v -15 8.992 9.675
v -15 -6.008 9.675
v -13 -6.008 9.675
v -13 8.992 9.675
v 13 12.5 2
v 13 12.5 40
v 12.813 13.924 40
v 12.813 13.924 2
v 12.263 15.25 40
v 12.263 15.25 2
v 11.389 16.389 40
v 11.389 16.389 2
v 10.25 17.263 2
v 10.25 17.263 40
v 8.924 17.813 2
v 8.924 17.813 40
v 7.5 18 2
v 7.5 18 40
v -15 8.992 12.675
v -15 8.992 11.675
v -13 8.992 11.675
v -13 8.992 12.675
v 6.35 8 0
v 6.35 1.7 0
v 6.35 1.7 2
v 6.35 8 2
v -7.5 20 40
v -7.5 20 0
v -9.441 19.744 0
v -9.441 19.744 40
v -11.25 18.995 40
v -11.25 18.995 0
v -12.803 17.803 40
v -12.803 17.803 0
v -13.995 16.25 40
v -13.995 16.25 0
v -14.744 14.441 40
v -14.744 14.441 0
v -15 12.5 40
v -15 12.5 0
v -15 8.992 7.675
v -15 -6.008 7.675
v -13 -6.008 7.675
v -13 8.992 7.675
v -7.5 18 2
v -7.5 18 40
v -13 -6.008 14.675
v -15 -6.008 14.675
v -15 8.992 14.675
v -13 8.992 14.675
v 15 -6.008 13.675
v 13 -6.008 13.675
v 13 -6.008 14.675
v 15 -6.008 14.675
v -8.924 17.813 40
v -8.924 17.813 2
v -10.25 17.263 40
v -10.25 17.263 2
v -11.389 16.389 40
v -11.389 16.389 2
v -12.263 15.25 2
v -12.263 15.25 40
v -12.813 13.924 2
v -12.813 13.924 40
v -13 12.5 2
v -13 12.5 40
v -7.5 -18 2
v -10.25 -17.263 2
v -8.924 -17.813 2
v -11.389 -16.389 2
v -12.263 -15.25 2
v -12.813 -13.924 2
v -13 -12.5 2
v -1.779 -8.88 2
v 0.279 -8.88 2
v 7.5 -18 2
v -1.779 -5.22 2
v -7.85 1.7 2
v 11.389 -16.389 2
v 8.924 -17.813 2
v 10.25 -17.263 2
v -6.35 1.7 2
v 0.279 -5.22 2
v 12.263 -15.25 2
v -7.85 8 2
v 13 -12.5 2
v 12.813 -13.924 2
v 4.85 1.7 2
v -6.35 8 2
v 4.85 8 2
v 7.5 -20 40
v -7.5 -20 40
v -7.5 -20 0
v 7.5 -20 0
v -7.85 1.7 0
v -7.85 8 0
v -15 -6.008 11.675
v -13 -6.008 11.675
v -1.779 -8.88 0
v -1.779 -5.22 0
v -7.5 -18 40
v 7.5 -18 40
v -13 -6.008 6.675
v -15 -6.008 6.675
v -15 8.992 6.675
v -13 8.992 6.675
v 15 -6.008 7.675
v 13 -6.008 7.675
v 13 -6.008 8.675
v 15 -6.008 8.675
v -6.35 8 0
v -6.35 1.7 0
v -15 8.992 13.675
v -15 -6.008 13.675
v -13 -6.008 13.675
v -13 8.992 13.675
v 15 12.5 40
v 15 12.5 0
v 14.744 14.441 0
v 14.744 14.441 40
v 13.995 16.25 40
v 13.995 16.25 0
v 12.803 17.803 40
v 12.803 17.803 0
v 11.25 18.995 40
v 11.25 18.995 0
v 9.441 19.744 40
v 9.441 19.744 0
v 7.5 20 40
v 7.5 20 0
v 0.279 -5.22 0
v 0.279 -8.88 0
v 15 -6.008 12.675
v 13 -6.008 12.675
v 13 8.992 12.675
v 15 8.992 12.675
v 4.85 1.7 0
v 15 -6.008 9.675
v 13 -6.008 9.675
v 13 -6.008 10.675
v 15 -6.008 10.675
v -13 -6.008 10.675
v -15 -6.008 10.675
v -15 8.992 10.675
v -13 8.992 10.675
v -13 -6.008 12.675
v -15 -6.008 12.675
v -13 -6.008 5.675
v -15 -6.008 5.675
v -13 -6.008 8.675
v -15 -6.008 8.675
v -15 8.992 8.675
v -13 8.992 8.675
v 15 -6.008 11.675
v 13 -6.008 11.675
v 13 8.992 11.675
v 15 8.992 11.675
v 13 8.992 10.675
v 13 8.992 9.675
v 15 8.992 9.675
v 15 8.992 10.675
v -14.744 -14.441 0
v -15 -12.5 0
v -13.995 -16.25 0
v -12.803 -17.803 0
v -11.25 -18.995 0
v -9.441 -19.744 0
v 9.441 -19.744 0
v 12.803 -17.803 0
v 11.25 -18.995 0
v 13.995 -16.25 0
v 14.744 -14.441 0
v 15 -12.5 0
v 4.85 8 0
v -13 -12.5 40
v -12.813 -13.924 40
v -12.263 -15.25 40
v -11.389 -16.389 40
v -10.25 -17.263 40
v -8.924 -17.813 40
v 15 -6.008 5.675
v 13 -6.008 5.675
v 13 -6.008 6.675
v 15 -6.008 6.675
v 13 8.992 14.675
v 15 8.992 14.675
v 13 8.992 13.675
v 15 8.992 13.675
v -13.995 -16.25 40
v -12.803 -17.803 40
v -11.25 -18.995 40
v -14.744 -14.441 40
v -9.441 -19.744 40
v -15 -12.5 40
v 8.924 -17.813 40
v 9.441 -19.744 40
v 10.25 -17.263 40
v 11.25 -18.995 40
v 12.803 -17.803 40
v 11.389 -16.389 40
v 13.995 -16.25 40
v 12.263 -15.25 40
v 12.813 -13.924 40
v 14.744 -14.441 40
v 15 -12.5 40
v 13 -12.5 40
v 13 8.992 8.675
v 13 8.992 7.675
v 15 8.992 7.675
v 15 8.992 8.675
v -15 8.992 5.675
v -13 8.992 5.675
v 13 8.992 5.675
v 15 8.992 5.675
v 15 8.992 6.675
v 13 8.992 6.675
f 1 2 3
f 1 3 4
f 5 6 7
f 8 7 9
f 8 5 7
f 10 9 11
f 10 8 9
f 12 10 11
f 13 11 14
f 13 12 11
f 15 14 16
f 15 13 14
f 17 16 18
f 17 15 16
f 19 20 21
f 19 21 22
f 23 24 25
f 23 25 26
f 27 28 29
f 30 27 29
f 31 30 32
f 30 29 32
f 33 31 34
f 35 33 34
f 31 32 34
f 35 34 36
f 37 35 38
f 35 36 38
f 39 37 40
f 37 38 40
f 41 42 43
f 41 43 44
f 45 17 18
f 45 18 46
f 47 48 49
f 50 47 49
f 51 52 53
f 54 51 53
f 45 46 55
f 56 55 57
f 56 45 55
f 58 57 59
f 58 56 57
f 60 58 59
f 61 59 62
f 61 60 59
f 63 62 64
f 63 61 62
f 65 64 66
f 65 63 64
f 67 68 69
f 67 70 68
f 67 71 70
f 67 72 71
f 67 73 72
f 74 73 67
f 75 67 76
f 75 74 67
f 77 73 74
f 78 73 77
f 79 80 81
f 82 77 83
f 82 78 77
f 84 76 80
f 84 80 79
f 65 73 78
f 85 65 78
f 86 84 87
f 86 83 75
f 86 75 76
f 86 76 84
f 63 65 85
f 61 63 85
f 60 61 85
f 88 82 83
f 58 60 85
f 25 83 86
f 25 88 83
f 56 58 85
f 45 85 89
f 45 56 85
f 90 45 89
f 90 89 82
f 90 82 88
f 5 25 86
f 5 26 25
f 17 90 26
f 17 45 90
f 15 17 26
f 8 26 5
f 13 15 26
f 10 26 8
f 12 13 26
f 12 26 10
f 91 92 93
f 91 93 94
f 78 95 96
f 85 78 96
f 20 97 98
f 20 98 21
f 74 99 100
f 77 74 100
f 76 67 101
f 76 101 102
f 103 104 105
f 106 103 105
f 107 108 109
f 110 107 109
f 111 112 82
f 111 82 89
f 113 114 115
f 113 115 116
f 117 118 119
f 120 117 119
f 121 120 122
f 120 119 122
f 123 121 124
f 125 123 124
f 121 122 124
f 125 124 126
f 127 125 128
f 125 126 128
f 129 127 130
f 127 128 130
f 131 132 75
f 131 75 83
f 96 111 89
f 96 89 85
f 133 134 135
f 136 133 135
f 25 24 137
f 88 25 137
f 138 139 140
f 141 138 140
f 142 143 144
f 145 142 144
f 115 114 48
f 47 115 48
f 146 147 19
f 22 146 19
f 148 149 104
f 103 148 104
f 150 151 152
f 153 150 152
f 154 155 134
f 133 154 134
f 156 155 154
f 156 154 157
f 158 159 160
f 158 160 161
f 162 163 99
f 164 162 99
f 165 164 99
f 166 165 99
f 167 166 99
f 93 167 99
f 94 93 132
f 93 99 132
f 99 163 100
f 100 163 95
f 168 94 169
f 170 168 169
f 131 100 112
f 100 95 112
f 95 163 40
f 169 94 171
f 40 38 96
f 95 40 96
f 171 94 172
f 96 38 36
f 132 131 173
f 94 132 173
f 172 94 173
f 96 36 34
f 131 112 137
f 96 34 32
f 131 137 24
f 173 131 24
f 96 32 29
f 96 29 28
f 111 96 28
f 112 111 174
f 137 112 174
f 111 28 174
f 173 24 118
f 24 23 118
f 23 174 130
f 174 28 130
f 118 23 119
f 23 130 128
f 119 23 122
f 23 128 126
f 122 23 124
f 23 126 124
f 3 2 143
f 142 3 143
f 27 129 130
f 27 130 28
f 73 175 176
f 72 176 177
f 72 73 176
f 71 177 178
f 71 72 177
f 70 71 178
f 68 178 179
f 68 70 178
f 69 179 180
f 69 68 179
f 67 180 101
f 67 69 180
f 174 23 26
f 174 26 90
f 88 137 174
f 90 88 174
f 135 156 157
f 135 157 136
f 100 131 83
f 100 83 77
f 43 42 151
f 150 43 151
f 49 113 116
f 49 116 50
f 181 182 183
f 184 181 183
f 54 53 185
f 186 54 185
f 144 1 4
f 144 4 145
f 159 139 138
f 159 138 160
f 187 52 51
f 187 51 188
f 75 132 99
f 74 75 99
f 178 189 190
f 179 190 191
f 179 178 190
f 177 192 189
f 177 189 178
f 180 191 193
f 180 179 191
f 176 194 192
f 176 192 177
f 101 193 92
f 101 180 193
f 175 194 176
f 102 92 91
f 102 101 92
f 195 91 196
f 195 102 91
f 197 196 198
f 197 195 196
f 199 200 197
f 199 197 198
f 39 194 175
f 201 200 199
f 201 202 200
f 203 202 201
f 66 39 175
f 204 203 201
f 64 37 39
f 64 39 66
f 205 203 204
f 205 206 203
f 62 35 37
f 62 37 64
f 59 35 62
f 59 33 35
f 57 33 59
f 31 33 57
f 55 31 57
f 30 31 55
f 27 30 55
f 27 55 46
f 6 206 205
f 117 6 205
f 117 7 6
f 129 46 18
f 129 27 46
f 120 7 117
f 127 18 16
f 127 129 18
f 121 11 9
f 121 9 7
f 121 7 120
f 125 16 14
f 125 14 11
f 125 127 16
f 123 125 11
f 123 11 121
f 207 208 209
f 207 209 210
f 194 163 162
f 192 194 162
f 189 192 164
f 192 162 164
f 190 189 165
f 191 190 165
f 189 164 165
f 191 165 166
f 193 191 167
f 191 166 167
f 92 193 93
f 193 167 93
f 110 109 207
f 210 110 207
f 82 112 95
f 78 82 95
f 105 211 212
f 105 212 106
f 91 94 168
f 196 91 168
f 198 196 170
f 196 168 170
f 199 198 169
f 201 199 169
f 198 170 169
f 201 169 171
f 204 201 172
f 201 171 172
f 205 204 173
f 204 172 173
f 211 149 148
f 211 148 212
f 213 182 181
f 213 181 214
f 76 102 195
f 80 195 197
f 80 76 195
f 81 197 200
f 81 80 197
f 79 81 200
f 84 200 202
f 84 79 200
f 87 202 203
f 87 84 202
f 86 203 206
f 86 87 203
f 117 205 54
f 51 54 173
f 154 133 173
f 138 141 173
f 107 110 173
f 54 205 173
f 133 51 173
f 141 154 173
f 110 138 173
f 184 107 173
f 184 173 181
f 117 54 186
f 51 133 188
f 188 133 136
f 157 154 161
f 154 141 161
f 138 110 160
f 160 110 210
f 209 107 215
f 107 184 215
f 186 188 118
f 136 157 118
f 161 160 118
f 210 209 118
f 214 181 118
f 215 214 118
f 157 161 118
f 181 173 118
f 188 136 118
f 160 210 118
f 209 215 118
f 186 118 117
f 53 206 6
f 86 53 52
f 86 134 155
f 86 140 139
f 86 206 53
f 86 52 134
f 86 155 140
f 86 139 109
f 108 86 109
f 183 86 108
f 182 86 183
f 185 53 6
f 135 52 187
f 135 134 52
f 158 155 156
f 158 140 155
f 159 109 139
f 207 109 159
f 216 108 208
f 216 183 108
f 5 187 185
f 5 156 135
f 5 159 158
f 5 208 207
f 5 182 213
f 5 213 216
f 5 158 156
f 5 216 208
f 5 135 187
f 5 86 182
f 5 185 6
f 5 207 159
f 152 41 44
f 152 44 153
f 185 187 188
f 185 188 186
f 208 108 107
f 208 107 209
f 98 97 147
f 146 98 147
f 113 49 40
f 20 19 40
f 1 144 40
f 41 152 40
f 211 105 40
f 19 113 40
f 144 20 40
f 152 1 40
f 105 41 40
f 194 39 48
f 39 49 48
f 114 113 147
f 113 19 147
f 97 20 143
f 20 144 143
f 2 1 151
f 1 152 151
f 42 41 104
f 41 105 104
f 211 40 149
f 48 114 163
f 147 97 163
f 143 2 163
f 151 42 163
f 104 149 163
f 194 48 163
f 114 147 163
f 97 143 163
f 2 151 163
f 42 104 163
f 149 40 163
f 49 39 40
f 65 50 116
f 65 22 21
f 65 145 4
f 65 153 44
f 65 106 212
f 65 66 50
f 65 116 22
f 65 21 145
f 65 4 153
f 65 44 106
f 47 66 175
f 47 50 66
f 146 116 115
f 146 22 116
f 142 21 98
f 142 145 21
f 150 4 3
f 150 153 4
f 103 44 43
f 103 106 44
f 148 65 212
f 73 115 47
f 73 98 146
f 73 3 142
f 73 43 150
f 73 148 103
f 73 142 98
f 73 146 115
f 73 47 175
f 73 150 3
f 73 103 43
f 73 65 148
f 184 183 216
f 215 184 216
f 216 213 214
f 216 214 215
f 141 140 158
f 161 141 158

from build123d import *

# Parameters (mm, degrees)
BOSS_EXTRUDE1_DEPTH     = 40
SHELL1_T                = -2
SKETCH2_W               = 1.5
SKETCH2_H               = 6.3
SKETCH2_W_2             = 2.058506146
SKETCH2_H_2             = 3.660298136
CUT_EXTRUDE1_DEPTH      = 25
SKETCH3_W               = 1
SKETCH3_H               = 15
CUT_EXTRUDE2_DEPTH      = 1
CUT_EXTRUDE2_DEPTH_BACK = 31


with BuildPart() as part:
    # Sketch1 → Boss-Extrude1 (new body)
    with BuildSketch(Plane.XY):
        with BuildLine():
            Line((-7.5, -20), (7.5, -20))
            ThreePointArc((7.5, -20), (12.803300859, -17.803300859), (15, -12.5))
            Line((15, -12.5), (15, 12.5))
            ThreePointArc((15, 12.5), (12.803300859, 17.803300859), (7.5, 20))
            Line((7.5, 20), (-7.5, 20))
            ThreePointArc((-7.5, 20), (-12.803300859, 17.803300859), (-15, 12.5))
            Line((-15, 12.5), (-15, -12.5))
            ThreePointArc((-15, -12.5), (-12.803300859, -17.803300859), (-7.5, -20))
        make_face()
    extrude(amount=BOSS_EXTRUDE1_DEPTH)

    # Shell1
    shell1_openings = [part.faces().sort_by_distance(p)[0] for p in [
        (0, 0, 40),
    ]]
    offset(amount=SHELL1_T, openings=shell1_openings, kind=Kind.INTERSECTION)

    # Sketch2 → Cut-Extrude1 (cut)
    with BuildSketch(Plane(origin=(0, 0, 0), x_dir=(-1, 0, 0), z_dir=(0, 0, -1))):
        with Locations((-5.6, 4.85)):
            Rectangle(SKETCH2_W, SKETCH2_H)
        with Locations((7.1, 4.85)):
            Rectangle(SKETCH2_W, SKETCH2_H)
        with Locations((0.75, -7.05)):
            Rectangle(SKETCH2_W_2, SKETCH2_H_2)
    extrude(amount=-CUT_EXTRUDE1_DEPTH, mode=Mode.SUBTRACT)

    # Sketch3 → Cut-Extrude2 (cut, two sides)
    with BuildSketch(Plane.ZY.offset(15)) as cut_extrude2_sk:
        with Locations((8.174979933, 1.491514735)):
            Rectangle(SKETCH3_W, SKETCH3_H)
        with Locations((6.174979933, 1.491514735)):
            Rectangle(SKETCH3_W, SKETCH3_H)
        with Locations((10.174979933, 1.491514735)):
            Rectangle(SKETCH3_W, SKETCH3_H)
        with Locations((12.174979933, 1.491514735)):
            Rectangle(SKETCH3_W, SKETCH3_H)
        with Locations((14.174979933, 1.491514735)):
            Rectangle(SKETCH3_W, SKETCH3_H)
    extrude(amount=CUT_EXTRUDE2_DEPTH, mode=Mode.SUBTRACT)
    extrude(cut_extrude2_sk.sketch, amount=-CUT_EXTRUDE2_DEPTH_BACK, mode=Mode.SUBTRACT)


solid = part.part
